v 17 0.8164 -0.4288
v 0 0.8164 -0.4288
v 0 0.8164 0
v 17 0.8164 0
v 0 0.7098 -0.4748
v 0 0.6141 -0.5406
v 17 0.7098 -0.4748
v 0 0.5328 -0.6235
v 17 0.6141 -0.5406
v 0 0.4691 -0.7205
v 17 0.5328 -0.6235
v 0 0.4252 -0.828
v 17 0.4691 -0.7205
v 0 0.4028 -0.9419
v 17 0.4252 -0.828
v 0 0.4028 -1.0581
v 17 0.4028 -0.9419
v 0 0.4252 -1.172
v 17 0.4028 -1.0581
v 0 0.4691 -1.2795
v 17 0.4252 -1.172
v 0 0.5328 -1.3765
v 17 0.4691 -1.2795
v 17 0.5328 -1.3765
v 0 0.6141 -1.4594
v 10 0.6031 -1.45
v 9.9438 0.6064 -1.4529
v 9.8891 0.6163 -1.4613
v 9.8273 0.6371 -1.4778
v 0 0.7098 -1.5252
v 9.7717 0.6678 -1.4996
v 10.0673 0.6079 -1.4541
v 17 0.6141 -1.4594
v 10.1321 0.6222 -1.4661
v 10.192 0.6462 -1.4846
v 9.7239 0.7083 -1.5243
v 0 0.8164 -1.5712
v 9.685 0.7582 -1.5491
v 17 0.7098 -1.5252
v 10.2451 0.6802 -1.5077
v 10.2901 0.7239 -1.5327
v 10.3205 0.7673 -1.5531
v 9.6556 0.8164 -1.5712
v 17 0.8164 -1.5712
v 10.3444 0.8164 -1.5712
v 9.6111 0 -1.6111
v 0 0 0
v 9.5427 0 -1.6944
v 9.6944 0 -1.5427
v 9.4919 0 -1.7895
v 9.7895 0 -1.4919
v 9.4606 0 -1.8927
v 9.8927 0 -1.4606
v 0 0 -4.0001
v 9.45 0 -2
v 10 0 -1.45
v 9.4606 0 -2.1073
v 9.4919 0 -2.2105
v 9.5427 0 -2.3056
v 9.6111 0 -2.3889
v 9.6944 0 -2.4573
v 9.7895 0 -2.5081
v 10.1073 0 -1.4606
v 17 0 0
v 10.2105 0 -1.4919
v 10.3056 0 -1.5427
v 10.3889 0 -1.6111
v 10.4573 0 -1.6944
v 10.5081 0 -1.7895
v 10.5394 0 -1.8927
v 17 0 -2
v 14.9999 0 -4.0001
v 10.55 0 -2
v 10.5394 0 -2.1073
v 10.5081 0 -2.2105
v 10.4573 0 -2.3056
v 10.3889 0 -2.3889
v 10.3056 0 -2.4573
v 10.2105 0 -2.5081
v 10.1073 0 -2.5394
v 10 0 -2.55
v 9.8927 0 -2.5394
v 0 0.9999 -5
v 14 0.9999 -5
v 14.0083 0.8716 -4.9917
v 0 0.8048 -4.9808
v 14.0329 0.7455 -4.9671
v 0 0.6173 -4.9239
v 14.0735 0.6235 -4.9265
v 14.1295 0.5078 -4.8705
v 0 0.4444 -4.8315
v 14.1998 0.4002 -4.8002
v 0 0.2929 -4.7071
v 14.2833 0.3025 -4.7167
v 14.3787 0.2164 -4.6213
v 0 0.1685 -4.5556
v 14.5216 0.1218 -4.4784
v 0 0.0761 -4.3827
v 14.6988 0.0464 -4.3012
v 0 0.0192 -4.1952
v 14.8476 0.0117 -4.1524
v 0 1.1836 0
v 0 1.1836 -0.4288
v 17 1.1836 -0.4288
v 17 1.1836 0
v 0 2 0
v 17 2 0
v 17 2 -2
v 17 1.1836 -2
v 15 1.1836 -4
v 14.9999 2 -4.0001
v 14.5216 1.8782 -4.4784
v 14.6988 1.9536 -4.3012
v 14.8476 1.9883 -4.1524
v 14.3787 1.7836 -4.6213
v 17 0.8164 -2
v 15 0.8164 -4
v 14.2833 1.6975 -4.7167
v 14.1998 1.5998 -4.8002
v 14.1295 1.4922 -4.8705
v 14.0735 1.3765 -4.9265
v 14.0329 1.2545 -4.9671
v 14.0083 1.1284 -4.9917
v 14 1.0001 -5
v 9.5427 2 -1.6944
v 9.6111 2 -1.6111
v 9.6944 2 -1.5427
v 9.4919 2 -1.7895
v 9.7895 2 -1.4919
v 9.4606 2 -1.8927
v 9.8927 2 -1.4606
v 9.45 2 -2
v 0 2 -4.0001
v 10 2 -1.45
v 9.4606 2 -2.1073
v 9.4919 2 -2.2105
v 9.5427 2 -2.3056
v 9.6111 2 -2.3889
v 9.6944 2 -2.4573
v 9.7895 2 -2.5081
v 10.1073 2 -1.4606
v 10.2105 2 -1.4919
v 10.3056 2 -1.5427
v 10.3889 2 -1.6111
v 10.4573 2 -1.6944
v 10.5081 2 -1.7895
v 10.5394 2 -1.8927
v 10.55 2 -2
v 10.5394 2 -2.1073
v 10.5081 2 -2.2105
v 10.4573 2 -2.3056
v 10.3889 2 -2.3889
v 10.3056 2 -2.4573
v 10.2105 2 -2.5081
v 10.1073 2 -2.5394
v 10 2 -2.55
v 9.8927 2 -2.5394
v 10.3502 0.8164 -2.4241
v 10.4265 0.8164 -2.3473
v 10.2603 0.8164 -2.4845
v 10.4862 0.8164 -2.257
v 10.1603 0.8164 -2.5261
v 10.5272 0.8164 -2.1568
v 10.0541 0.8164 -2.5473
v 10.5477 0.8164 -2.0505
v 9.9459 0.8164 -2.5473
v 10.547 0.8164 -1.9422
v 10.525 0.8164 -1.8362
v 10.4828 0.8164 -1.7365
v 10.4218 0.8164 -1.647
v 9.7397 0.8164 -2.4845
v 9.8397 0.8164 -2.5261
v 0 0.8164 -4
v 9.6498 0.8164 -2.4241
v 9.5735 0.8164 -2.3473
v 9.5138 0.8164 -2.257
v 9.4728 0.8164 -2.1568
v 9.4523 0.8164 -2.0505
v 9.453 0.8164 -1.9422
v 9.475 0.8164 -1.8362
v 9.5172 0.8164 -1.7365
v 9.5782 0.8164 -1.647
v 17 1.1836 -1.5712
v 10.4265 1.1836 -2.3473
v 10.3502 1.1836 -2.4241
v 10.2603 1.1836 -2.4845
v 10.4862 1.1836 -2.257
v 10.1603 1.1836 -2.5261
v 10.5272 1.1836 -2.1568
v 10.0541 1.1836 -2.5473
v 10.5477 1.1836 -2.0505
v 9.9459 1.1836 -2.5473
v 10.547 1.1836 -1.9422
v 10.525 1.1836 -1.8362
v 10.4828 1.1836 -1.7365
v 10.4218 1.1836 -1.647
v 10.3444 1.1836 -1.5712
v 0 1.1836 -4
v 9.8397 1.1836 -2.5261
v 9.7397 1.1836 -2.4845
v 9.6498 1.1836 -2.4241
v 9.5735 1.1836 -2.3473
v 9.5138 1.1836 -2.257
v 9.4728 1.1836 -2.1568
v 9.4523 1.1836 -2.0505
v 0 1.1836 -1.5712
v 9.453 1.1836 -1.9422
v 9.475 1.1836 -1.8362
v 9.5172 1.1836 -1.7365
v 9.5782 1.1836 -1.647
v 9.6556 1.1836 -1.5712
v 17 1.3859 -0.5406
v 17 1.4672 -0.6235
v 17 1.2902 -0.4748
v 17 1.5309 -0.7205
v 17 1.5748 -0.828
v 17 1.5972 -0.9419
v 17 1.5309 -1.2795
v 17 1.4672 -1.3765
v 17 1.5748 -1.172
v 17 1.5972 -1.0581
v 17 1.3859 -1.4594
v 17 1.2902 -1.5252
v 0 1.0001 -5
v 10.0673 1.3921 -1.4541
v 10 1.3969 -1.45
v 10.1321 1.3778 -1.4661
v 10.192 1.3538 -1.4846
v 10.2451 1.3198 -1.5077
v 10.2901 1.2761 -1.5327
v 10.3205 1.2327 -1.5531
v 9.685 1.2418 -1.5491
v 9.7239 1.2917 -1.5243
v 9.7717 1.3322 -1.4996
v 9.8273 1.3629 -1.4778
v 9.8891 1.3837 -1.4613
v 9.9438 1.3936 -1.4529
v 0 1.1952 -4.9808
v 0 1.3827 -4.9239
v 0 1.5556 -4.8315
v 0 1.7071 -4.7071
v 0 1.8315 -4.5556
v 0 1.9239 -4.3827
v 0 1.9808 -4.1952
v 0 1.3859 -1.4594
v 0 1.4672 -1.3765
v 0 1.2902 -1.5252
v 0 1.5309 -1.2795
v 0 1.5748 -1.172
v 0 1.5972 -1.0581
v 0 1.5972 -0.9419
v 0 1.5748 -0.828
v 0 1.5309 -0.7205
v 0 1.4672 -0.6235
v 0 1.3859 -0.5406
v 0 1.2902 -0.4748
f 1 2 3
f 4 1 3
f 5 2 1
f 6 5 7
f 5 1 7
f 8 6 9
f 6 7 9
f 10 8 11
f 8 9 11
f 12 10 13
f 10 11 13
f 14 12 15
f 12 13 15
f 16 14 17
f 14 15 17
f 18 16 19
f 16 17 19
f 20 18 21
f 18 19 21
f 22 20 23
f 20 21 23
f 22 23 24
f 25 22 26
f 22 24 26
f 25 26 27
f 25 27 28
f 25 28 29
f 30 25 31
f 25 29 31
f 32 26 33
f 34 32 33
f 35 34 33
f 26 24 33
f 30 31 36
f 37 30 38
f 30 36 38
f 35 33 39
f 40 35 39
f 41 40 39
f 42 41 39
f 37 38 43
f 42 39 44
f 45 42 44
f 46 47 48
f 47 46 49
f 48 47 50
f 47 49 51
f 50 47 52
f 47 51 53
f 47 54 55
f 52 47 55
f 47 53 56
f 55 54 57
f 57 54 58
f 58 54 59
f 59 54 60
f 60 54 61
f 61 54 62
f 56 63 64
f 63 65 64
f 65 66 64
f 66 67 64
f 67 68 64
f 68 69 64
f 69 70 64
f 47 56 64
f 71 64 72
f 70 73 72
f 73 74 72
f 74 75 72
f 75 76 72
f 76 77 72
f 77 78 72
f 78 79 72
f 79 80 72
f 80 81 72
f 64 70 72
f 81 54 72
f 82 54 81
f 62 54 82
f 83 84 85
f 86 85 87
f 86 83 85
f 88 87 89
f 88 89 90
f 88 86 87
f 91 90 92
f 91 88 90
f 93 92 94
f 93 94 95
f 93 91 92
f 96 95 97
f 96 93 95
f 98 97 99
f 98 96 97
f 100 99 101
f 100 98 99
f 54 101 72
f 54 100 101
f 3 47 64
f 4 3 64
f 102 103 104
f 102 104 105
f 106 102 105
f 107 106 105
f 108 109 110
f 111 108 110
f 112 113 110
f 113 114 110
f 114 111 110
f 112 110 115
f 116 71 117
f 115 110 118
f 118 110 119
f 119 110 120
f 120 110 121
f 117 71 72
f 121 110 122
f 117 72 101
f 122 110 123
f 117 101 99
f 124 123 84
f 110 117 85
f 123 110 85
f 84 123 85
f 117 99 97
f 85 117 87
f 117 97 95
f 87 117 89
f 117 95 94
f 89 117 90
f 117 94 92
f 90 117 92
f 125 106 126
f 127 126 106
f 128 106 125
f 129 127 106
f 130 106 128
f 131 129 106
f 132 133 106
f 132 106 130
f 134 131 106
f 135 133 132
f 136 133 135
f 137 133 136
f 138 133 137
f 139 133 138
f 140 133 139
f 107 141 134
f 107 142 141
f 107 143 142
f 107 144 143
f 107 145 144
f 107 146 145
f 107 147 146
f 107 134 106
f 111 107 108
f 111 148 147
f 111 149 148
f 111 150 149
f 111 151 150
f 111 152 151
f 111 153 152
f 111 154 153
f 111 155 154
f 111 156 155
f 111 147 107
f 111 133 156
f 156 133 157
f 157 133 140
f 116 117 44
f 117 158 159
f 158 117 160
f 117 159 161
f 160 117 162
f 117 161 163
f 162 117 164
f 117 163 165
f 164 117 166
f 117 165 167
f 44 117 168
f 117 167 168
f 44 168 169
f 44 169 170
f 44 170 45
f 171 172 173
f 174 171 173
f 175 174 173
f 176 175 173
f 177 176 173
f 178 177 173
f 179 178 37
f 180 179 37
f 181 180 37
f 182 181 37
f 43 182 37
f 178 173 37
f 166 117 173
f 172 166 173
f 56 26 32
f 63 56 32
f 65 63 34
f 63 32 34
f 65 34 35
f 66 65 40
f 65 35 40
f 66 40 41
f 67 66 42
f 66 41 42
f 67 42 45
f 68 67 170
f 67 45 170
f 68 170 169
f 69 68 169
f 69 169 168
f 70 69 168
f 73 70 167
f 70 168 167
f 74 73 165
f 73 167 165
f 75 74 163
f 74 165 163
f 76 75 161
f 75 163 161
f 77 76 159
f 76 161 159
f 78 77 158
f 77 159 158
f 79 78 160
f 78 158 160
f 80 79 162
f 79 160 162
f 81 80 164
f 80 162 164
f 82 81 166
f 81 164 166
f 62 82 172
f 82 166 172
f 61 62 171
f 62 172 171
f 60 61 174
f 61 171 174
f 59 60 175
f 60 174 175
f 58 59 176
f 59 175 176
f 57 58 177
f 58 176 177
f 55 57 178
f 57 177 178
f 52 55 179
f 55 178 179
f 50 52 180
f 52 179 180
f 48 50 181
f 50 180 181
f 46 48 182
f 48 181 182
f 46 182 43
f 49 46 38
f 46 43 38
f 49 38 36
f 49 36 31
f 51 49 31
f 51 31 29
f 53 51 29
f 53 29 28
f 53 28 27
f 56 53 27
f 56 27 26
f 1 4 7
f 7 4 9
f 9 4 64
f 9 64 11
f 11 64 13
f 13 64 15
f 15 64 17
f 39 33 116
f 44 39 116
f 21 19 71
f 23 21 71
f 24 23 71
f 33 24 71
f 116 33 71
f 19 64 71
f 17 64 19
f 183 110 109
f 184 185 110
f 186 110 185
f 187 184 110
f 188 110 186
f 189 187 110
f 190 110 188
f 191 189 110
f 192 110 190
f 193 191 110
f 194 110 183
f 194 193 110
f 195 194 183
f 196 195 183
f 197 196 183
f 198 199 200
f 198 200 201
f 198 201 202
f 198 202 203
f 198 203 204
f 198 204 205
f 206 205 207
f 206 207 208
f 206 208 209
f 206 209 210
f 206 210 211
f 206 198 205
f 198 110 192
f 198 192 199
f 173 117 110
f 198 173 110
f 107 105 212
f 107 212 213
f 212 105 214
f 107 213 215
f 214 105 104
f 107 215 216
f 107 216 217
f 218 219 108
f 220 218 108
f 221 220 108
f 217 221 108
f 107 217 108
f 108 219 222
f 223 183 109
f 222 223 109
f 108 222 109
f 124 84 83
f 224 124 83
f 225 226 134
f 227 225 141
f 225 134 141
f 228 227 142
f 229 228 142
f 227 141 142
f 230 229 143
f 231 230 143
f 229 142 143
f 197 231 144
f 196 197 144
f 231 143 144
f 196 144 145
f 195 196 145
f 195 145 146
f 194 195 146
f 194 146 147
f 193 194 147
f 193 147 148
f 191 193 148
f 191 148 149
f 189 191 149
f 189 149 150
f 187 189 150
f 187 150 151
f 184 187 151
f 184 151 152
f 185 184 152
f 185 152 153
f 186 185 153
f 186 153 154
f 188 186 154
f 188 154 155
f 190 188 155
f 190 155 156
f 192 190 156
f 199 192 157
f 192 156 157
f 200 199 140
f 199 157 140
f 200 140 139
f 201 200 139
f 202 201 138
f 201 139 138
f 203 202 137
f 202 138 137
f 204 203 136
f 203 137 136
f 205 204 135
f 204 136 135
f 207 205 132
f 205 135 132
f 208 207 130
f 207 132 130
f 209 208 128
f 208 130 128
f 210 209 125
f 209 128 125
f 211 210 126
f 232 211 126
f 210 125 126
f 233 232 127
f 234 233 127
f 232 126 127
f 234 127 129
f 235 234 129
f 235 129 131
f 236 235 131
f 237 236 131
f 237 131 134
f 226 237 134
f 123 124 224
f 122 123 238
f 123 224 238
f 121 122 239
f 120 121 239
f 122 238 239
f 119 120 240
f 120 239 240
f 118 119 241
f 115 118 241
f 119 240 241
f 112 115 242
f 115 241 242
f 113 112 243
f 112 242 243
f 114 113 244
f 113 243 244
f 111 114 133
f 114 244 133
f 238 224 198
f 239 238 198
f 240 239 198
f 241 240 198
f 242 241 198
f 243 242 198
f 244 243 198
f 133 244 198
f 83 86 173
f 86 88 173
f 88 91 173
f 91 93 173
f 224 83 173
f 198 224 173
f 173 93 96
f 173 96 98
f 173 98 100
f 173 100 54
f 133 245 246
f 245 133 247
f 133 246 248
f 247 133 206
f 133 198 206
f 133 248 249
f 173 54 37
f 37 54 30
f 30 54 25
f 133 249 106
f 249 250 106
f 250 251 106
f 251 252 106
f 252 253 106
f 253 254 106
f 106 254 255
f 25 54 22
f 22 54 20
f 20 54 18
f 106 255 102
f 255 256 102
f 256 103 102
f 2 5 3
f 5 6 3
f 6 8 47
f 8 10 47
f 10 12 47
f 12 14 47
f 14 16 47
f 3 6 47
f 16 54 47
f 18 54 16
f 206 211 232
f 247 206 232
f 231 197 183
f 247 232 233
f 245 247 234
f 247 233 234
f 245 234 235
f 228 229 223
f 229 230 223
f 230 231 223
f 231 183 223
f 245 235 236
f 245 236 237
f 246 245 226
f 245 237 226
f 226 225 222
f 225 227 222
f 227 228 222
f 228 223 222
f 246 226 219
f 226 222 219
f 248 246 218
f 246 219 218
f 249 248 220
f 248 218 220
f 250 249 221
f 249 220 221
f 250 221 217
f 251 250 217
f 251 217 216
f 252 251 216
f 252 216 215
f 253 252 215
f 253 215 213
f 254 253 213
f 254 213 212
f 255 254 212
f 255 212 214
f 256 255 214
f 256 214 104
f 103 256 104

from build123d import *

# Parameters (mm, degrees)
EXTRUDE_1_DEPTH     = 2
SKETCH_2_R          = 0.6
CUT_EXTRUDE_1_DEPTH = 18.8325545
FILLET_1_R          = 1
SKETCH_3_W          = 8
SKETCH_3_H          = 0.367219666
CUT_EXTRUDE_2_DEPTH = 18.8325545
SKETCH_4_R          = 0.55
CUT_EXTRUDE_3_DEPTH = 18.8325545


with BuildPart() as part:
    # 草图1 → 凸台-拉伸1 (new body)
    with BuildSketch(Plane(origin=(0, 0, 0), x_dir=(1, 0, 0), z_dir=(0, 1, 0))):
        Polygon((17, 2), (14, 5), (0, 5), (0, 0), (17, 0), align=None)
    extrude(amount=EXTRUDE_1_DEPTH)

    # 草图2 → 切除-拉伸1 (cut, through all)
    with BuildSketch(Plane(origin=(17, 0, 0), x_dir=(0, 0, -1), z_dir=(1, 0, 0))):
        with Locations((1, 1)):
            Circle(SKETCH_2_R)
    extrude(amount=-CUT_EXTRUDE_1_DEPTH, mode=Mode.SUBTRACT)

    # 圆角1
    fillet_1_edges = [part.edges().sort_by_distance(p)[0] for p in [
        (7, 0, -5),
        (7, 2, -5),
    ]]
    fillet(fillet_1_edges, radius=FILLET_1_R - 0.0001)  # a hair under: the kernel refuses the full size

    # 草图3 → 切除-拉伸2 (cut, through all)
    with BuildSketch(Plane.ZY):
        with Locations((0, 1)):
            Rectangle(SKETCH_3_W, SKETCH_3_H)
    extrude(amount=-CUT_EXTRUDE_2_DEPTH, mode=Mode.SUBTRACT)

    # 草图4 → 切除-拉伸3 (cut, through all)
    with BuildSketch(Plane(origin=(0, 2, 0), x_dir=(1, 0, 0), z_dir=(0, 1, 0))):
        with Locations(Location((10, 2, 0), (0, 0, 270))):
            Circle(SKETCH_4_R)
    extrude(amount=-CUT_EXTRUDE_3_DEPTH, mode=Mode.SUBTRACT)


solid = part.part
